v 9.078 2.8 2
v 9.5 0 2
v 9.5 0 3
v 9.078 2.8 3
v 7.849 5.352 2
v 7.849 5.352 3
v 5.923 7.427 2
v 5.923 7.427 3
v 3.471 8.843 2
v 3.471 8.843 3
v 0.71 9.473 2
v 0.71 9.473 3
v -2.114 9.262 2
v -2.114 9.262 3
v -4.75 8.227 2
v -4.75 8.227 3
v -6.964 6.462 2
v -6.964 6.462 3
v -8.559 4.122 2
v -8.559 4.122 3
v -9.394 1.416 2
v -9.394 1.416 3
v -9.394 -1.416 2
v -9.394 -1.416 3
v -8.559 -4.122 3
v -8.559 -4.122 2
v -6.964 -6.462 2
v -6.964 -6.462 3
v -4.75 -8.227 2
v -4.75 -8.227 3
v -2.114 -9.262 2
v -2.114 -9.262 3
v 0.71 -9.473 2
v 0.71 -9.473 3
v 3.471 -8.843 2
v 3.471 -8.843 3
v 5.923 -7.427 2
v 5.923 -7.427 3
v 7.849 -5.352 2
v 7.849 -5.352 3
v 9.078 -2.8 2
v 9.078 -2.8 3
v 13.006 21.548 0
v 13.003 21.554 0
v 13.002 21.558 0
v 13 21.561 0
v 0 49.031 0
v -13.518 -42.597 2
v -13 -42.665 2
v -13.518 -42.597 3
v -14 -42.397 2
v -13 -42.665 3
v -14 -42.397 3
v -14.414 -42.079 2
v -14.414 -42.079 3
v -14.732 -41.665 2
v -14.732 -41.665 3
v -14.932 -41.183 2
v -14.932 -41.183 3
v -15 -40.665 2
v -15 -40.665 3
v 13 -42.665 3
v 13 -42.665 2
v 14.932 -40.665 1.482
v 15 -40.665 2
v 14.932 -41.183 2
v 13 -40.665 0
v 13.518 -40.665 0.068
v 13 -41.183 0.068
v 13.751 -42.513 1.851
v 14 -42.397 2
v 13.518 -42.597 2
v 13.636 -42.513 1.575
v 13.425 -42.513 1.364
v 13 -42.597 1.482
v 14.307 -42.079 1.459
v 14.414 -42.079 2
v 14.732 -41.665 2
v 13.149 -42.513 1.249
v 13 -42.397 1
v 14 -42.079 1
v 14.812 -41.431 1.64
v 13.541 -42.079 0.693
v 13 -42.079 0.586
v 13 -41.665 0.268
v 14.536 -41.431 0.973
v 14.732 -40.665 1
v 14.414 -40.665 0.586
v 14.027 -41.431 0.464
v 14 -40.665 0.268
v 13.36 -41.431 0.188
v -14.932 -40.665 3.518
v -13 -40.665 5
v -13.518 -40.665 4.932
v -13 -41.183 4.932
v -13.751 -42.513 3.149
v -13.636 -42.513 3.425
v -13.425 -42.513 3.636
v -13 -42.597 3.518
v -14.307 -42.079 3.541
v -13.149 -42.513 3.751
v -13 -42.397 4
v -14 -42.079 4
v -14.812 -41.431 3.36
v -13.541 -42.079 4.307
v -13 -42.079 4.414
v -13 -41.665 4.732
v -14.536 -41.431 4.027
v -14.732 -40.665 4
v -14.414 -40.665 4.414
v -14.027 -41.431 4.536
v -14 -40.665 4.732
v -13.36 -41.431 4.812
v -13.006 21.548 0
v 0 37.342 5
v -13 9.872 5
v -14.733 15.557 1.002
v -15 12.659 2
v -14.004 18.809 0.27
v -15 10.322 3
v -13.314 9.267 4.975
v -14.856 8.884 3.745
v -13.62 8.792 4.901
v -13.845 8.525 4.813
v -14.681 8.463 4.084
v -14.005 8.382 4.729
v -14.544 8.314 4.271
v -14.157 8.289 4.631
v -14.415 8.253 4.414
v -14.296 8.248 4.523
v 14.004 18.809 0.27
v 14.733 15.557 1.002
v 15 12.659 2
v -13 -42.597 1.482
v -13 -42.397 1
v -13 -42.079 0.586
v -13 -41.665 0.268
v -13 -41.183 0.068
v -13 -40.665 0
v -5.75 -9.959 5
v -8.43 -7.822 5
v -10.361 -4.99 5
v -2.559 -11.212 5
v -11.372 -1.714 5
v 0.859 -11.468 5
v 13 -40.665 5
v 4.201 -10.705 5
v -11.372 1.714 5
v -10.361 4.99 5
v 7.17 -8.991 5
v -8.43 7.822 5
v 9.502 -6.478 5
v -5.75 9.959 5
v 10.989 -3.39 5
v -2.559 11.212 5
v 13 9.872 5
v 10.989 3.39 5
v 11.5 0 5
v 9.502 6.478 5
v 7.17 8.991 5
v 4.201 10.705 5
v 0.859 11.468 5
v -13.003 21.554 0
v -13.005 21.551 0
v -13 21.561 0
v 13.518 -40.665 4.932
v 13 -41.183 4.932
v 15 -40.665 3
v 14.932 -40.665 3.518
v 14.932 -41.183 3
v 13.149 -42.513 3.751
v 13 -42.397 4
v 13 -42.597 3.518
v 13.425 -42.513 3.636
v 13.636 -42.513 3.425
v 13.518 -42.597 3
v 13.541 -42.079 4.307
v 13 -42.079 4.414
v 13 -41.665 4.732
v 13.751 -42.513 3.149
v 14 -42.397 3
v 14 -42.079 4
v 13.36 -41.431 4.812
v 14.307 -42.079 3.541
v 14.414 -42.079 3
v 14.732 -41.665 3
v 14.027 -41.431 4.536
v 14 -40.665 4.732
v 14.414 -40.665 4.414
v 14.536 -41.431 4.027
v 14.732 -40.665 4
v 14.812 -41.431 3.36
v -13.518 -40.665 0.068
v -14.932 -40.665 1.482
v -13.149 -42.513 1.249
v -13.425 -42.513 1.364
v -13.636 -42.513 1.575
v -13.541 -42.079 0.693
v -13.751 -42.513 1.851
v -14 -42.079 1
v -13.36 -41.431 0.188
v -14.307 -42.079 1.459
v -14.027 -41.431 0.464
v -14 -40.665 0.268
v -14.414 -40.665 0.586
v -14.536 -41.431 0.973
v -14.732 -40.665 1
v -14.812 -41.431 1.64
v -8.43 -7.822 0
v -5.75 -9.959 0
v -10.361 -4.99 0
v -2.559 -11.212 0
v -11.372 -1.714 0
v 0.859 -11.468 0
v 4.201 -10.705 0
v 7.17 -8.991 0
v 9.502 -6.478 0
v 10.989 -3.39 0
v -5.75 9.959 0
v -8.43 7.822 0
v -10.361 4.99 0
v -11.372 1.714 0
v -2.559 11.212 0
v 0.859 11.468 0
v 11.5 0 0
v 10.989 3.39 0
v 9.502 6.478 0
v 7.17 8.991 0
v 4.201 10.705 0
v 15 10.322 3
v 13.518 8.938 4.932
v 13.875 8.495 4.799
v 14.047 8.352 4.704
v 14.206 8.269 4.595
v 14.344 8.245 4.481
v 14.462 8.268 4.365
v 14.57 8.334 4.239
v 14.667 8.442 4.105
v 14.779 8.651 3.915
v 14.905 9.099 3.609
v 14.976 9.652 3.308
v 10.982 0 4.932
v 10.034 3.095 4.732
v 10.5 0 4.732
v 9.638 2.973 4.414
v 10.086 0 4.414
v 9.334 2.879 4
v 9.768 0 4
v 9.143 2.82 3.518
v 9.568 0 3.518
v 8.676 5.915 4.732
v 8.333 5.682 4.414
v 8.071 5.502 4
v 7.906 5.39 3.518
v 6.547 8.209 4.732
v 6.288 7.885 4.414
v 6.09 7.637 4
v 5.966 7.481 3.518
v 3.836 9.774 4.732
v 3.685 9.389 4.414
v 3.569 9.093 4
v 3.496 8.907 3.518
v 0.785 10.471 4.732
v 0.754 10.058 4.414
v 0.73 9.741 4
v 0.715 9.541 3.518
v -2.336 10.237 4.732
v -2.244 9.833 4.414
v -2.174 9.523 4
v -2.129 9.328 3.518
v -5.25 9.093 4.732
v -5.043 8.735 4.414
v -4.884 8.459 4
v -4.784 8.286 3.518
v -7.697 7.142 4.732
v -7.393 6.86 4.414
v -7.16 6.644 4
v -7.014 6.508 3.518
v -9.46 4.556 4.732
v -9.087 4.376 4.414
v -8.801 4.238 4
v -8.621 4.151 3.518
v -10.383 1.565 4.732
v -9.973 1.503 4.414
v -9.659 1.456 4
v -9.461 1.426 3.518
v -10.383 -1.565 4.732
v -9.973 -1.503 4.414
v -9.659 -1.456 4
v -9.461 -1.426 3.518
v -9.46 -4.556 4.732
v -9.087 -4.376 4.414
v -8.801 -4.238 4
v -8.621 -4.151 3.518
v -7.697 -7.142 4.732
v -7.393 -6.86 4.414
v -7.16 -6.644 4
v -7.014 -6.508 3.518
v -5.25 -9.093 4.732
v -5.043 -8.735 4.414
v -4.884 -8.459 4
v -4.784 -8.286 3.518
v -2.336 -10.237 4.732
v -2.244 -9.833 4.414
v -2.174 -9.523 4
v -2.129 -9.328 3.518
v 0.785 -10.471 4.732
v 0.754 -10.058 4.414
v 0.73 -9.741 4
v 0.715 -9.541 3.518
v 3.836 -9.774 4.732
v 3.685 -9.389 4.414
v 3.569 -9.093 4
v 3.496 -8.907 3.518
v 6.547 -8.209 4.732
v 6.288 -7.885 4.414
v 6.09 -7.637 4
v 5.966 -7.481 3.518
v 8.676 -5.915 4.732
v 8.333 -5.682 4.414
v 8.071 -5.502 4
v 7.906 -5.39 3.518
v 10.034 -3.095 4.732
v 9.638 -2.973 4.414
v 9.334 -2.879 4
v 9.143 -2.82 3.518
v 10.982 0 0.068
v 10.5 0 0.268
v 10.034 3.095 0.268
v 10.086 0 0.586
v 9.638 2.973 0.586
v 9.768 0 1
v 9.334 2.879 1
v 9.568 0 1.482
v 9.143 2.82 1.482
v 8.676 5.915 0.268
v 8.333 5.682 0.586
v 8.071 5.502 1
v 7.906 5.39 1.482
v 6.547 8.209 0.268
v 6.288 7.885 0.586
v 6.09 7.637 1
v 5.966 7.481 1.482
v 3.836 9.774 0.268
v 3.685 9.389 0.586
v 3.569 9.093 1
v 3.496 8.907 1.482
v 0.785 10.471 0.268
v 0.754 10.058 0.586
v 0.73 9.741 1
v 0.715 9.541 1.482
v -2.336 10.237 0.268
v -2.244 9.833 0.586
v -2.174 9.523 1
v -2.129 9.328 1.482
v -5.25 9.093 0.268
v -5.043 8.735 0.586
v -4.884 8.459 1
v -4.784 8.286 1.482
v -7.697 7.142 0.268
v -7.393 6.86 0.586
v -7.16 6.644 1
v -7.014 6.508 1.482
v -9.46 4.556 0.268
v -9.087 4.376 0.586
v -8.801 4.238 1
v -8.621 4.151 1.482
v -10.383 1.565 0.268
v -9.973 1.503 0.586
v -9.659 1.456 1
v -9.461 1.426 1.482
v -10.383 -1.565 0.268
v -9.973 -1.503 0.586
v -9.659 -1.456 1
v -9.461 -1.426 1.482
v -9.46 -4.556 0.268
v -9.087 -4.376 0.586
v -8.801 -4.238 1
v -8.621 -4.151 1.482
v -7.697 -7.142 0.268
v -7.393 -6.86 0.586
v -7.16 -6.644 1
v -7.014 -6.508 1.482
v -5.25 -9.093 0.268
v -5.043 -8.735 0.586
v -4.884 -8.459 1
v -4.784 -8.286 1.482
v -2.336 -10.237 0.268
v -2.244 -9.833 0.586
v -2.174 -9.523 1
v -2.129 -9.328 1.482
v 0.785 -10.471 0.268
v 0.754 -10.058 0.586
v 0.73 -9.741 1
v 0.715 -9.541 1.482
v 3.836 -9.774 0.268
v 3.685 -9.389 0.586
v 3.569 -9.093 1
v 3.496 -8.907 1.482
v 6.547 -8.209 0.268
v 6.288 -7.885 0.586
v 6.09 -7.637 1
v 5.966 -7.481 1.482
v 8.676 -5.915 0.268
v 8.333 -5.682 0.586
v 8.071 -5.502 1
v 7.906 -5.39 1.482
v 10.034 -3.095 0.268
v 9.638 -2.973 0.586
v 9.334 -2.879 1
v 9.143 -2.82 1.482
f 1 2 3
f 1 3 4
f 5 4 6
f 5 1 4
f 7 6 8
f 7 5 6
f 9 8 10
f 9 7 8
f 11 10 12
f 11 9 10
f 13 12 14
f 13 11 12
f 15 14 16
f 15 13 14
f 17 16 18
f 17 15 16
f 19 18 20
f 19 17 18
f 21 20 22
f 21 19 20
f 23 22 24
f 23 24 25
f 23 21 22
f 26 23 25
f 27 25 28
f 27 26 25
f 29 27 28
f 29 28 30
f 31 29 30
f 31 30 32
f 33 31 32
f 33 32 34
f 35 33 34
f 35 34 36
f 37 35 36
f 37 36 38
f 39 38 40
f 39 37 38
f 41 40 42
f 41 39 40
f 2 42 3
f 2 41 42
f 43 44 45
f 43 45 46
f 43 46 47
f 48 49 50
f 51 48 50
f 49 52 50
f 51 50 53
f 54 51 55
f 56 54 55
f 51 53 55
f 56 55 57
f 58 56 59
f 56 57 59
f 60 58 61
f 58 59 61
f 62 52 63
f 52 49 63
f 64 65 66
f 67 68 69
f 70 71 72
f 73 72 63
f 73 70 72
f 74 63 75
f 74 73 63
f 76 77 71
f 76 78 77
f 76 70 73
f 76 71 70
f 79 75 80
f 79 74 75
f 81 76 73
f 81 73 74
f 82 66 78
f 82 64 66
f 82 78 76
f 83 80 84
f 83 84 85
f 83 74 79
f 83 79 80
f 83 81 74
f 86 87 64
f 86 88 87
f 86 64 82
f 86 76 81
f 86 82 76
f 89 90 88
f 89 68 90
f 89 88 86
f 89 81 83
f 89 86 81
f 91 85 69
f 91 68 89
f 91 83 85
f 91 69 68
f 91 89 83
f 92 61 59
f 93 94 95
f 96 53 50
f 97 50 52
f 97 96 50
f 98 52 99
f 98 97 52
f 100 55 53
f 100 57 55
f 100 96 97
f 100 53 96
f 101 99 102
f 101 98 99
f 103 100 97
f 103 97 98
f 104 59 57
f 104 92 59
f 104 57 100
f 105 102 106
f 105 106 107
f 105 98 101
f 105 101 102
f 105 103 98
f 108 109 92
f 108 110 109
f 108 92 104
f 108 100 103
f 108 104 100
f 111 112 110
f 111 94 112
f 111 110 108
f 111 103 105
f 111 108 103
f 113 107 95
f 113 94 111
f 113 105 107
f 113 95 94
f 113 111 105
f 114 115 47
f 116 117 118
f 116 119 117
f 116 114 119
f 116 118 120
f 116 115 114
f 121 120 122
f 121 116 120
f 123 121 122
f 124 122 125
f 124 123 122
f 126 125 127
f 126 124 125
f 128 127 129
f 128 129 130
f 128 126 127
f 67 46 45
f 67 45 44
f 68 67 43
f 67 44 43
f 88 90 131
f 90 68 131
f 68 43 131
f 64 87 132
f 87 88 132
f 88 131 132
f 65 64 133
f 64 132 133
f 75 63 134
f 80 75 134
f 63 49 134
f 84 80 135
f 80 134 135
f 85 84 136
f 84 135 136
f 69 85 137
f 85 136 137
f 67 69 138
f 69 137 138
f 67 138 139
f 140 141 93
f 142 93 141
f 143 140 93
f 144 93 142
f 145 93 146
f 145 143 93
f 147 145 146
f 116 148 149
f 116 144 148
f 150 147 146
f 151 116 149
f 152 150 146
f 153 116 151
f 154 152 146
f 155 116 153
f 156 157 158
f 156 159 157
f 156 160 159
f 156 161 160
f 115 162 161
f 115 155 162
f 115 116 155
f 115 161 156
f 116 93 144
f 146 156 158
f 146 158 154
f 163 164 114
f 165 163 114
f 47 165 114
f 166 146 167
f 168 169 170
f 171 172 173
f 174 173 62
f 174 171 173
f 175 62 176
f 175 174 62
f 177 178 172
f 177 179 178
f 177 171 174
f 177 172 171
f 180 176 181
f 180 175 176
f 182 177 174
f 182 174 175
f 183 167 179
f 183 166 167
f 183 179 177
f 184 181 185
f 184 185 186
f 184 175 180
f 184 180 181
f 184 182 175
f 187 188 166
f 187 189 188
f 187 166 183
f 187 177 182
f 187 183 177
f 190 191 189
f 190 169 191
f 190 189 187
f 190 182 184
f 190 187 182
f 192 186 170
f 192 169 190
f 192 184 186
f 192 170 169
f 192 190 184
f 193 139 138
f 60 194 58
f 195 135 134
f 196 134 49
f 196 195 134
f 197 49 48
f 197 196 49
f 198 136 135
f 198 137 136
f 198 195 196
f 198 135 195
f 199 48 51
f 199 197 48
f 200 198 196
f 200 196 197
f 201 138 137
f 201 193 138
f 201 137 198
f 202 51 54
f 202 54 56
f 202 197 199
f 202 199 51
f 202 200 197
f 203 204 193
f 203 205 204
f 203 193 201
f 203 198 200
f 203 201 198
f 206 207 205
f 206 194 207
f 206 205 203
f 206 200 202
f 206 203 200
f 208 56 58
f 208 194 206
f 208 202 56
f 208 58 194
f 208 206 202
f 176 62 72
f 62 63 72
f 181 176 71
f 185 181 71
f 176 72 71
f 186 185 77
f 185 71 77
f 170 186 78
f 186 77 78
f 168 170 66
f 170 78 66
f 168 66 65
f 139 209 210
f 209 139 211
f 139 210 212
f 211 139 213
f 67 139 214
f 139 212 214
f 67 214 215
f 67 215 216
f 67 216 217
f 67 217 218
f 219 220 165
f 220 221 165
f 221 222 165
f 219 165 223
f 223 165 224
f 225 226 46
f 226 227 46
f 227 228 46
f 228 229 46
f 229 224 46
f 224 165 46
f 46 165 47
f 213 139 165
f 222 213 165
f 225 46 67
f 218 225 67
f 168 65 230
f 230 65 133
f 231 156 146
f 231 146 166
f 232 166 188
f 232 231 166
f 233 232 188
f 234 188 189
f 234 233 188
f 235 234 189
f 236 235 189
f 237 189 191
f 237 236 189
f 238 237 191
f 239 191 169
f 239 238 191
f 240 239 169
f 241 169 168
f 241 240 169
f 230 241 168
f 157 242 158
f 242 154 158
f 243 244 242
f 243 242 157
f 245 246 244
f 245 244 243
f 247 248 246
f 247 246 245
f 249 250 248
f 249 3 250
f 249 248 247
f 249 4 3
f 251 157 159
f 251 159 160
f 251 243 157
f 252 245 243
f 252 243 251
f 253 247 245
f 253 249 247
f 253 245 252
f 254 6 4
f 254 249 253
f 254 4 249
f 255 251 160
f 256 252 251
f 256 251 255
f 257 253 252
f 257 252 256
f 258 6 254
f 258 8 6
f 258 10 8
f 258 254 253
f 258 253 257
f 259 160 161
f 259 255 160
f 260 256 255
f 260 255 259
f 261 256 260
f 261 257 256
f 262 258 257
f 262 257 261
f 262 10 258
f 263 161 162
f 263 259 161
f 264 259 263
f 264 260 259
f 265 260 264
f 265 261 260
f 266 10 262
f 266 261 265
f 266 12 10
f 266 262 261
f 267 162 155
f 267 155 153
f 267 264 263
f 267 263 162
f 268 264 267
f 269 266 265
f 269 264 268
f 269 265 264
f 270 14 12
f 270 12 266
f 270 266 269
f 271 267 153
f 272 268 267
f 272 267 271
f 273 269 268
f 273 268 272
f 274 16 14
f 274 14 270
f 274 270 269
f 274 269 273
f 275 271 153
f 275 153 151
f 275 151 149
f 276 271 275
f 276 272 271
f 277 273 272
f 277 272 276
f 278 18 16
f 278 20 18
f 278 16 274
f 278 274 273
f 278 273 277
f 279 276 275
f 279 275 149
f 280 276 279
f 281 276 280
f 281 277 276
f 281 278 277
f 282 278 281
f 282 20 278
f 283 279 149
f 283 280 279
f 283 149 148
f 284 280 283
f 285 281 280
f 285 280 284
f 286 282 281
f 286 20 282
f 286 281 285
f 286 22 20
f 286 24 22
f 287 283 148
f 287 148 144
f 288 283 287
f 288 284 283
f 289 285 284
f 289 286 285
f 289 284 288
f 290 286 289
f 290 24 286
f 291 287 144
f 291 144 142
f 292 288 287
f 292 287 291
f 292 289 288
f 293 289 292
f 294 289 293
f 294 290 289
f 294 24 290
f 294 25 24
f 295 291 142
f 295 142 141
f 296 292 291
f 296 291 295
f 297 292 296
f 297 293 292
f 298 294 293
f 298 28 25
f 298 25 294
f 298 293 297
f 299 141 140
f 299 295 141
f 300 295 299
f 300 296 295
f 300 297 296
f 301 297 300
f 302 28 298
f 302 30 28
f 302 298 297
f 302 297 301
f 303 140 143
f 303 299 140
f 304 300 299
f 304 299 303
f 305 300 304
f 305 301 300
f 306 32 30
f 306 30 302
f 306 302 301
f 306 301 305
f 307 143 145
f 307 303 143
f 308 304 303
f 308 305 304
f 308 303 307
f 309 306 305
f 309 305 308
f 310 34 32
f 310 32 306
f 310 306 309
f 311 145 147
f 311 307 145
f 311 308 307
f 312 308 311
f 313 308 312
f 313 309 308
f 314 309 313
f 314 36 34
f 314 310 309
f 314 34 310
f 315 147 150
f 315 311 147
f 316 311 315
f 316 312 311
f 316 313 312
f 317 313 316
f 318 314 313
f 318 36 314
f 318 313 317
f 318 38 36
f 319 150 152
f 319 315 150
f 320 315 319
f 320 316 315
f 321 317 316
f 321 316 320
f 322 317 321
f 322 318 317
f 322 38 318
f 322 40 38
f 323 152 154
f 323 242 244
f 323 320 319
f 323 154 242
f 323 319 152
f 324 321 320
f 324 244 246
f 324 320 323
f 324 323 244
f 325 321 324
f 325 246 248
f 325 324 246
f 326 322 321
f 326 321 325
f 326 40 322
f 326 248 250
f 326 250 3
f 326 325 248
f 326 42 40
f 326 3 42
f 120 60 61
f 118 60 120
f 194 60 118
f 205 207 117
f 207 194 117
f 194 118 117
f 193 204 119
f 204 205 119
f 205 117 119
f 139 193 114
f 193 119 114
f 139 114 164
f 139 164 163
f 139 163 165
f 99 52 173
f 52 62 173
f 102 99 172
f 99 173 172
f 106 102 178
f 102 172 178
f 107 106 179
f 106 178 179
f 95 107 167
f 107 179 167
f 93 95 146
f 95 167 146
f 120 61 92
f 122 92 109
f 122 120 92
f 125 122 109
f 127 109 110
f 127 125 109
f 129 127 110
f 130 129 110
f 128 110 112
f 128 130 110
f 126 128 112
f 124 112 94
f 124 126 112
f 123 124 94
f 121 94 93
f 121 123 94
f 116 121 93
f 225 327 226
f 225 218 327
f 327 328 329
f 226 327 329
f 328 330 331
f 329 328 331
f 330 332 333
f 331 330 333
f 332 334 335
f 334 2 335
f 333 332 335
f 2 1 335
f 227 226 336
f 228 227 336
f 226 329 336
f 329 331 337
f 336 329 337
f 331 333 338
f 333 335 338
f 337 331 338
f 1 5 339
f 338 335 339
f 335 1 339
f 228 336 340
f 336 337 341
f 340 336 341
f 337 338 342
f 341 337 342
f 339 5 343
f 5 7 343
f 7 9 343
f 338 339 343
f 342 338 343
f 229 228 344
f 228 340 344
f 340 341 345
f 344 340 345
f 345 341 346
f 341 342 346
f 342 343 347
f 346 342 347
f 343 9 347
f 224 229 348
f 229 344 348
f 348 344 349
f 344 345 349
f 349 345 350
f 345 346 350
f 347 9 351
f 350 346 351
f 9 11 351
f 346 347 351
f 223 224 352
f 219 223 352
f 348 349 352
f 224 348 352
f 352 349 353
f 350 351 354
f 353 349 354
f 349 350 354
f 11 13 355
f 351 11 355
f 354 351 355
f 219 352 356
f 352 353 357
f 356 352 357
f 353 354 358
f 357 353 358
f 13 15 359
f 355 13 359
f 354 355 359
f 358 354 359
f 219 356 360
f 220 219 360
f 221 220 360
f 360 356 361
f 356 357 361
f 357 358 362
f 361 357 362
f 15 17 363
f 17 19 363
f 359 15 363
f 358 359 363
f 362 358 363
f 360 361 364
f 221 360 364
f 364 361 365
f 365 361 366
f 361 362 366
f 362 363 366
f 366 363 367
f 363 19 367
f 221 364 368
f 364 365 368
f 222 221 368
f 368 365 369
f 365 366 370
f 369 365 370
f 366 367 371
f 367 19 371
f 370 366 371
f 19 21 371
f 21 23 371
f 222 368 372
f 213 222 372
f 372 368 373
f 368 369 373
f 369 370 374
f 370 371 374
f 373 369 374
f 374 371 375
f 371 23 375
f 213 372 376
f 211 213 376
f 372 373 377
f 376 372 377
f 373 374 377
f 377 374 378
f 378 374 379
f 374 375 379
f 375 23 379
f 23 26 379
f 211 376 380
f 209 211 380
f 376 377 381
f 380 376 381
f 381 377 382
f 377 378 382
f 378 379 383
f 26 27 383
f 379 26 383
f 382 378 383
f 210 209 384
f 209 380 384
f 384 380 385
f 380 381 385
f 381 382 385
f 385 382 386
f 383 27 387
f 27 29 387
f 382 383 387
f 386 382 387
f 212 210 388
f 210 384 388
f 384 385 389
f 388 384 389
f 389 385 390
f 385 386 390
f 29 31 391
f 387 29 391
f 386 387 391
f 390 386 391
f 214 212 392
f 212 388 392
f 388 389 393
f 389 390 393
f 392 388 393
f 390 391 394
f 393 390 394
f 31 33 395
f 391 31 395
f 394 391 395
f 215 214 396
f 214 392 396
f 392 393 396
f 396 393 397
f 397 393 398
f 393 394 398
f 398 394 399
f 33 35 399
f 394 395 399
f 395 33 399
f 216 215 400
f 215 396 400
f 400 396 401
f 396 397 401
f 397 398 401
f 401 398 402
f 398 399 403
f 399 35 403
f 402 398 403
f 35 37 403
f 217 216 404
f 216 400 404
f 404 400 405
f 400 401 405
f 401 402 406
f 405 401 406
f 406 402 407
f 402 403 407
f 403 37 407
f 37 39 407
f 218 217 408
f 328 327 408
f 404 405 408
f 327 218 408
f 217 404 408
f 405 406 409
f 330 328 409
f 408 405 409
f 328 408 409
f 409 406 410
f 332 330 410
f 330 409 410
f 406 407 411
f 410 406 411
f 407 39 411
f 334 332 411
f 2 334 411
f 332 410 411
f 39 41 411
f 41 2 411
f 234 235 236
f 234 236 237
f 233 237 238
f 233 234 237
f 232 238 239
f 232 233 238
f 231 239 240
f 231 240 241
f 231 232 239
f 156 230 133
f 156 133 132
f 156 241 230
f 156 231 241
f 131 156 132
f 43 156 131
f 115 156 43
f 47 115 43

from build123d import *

# Parameters (mm, degrees)
F0_W     = 30
F0_H     = 60
F0_R     = 9.5
F1_DEPTH = 5
F2_SIZE  = 4.99999
F3_R     = 2
F4_R     = 2


# Not quite as in the source:
# - a fillet or chamfer is up to 0.001 mm smaller than in the source, because OpenCascade refuses the exact size


with BuildPart() as f1:
    # F0 (on Top) → F1 (new body)
    with BuildSketch(Plane.XY):
        with Locations((0, -12.6652074978)):
            Rectangle(F0_W, F0_H)
        Circle(F0_R, mode=Mode.SUBTRACT)
        Polygon((-15, 17.3347925022), (15, 17.3347925022), (0, 49.0306541324), align=None)
    extrude(amount=F1_DEPTH)

    # F2 (size 5 in the source; OpenCascade refuses exactly that, so slightly less here)
    f2_edges = [f1.edges().sort_by_distance(p)[0] for p in [
        (-7.5, 33.182723, 5),
        (7.5, 33.182723, 5),
    ]]
    chamfer(f2_edges, length=F2_SIZE)

    # F3
    f3_edges = [f1.edges().sort_by_distance(p)[0] for p in [
        (-15, -18.509537, 5),
        (15, -18.509537, 5),
        (15, -12.665207, 0),
        (-15, -12.665207, 0),
        (-9.5, 0, 5),
        (-9.5, 0, 0),
    ]]
    fillet(f3_edges, radius=F3_R)

    # F4
    f4_edges = [f1.edges().sort_by_distance(p)[0] for p in [
        (0, -42.665207, 5),
    ]]
    fillet(f4_edges, radius=F4_R)


solid = f1.part
